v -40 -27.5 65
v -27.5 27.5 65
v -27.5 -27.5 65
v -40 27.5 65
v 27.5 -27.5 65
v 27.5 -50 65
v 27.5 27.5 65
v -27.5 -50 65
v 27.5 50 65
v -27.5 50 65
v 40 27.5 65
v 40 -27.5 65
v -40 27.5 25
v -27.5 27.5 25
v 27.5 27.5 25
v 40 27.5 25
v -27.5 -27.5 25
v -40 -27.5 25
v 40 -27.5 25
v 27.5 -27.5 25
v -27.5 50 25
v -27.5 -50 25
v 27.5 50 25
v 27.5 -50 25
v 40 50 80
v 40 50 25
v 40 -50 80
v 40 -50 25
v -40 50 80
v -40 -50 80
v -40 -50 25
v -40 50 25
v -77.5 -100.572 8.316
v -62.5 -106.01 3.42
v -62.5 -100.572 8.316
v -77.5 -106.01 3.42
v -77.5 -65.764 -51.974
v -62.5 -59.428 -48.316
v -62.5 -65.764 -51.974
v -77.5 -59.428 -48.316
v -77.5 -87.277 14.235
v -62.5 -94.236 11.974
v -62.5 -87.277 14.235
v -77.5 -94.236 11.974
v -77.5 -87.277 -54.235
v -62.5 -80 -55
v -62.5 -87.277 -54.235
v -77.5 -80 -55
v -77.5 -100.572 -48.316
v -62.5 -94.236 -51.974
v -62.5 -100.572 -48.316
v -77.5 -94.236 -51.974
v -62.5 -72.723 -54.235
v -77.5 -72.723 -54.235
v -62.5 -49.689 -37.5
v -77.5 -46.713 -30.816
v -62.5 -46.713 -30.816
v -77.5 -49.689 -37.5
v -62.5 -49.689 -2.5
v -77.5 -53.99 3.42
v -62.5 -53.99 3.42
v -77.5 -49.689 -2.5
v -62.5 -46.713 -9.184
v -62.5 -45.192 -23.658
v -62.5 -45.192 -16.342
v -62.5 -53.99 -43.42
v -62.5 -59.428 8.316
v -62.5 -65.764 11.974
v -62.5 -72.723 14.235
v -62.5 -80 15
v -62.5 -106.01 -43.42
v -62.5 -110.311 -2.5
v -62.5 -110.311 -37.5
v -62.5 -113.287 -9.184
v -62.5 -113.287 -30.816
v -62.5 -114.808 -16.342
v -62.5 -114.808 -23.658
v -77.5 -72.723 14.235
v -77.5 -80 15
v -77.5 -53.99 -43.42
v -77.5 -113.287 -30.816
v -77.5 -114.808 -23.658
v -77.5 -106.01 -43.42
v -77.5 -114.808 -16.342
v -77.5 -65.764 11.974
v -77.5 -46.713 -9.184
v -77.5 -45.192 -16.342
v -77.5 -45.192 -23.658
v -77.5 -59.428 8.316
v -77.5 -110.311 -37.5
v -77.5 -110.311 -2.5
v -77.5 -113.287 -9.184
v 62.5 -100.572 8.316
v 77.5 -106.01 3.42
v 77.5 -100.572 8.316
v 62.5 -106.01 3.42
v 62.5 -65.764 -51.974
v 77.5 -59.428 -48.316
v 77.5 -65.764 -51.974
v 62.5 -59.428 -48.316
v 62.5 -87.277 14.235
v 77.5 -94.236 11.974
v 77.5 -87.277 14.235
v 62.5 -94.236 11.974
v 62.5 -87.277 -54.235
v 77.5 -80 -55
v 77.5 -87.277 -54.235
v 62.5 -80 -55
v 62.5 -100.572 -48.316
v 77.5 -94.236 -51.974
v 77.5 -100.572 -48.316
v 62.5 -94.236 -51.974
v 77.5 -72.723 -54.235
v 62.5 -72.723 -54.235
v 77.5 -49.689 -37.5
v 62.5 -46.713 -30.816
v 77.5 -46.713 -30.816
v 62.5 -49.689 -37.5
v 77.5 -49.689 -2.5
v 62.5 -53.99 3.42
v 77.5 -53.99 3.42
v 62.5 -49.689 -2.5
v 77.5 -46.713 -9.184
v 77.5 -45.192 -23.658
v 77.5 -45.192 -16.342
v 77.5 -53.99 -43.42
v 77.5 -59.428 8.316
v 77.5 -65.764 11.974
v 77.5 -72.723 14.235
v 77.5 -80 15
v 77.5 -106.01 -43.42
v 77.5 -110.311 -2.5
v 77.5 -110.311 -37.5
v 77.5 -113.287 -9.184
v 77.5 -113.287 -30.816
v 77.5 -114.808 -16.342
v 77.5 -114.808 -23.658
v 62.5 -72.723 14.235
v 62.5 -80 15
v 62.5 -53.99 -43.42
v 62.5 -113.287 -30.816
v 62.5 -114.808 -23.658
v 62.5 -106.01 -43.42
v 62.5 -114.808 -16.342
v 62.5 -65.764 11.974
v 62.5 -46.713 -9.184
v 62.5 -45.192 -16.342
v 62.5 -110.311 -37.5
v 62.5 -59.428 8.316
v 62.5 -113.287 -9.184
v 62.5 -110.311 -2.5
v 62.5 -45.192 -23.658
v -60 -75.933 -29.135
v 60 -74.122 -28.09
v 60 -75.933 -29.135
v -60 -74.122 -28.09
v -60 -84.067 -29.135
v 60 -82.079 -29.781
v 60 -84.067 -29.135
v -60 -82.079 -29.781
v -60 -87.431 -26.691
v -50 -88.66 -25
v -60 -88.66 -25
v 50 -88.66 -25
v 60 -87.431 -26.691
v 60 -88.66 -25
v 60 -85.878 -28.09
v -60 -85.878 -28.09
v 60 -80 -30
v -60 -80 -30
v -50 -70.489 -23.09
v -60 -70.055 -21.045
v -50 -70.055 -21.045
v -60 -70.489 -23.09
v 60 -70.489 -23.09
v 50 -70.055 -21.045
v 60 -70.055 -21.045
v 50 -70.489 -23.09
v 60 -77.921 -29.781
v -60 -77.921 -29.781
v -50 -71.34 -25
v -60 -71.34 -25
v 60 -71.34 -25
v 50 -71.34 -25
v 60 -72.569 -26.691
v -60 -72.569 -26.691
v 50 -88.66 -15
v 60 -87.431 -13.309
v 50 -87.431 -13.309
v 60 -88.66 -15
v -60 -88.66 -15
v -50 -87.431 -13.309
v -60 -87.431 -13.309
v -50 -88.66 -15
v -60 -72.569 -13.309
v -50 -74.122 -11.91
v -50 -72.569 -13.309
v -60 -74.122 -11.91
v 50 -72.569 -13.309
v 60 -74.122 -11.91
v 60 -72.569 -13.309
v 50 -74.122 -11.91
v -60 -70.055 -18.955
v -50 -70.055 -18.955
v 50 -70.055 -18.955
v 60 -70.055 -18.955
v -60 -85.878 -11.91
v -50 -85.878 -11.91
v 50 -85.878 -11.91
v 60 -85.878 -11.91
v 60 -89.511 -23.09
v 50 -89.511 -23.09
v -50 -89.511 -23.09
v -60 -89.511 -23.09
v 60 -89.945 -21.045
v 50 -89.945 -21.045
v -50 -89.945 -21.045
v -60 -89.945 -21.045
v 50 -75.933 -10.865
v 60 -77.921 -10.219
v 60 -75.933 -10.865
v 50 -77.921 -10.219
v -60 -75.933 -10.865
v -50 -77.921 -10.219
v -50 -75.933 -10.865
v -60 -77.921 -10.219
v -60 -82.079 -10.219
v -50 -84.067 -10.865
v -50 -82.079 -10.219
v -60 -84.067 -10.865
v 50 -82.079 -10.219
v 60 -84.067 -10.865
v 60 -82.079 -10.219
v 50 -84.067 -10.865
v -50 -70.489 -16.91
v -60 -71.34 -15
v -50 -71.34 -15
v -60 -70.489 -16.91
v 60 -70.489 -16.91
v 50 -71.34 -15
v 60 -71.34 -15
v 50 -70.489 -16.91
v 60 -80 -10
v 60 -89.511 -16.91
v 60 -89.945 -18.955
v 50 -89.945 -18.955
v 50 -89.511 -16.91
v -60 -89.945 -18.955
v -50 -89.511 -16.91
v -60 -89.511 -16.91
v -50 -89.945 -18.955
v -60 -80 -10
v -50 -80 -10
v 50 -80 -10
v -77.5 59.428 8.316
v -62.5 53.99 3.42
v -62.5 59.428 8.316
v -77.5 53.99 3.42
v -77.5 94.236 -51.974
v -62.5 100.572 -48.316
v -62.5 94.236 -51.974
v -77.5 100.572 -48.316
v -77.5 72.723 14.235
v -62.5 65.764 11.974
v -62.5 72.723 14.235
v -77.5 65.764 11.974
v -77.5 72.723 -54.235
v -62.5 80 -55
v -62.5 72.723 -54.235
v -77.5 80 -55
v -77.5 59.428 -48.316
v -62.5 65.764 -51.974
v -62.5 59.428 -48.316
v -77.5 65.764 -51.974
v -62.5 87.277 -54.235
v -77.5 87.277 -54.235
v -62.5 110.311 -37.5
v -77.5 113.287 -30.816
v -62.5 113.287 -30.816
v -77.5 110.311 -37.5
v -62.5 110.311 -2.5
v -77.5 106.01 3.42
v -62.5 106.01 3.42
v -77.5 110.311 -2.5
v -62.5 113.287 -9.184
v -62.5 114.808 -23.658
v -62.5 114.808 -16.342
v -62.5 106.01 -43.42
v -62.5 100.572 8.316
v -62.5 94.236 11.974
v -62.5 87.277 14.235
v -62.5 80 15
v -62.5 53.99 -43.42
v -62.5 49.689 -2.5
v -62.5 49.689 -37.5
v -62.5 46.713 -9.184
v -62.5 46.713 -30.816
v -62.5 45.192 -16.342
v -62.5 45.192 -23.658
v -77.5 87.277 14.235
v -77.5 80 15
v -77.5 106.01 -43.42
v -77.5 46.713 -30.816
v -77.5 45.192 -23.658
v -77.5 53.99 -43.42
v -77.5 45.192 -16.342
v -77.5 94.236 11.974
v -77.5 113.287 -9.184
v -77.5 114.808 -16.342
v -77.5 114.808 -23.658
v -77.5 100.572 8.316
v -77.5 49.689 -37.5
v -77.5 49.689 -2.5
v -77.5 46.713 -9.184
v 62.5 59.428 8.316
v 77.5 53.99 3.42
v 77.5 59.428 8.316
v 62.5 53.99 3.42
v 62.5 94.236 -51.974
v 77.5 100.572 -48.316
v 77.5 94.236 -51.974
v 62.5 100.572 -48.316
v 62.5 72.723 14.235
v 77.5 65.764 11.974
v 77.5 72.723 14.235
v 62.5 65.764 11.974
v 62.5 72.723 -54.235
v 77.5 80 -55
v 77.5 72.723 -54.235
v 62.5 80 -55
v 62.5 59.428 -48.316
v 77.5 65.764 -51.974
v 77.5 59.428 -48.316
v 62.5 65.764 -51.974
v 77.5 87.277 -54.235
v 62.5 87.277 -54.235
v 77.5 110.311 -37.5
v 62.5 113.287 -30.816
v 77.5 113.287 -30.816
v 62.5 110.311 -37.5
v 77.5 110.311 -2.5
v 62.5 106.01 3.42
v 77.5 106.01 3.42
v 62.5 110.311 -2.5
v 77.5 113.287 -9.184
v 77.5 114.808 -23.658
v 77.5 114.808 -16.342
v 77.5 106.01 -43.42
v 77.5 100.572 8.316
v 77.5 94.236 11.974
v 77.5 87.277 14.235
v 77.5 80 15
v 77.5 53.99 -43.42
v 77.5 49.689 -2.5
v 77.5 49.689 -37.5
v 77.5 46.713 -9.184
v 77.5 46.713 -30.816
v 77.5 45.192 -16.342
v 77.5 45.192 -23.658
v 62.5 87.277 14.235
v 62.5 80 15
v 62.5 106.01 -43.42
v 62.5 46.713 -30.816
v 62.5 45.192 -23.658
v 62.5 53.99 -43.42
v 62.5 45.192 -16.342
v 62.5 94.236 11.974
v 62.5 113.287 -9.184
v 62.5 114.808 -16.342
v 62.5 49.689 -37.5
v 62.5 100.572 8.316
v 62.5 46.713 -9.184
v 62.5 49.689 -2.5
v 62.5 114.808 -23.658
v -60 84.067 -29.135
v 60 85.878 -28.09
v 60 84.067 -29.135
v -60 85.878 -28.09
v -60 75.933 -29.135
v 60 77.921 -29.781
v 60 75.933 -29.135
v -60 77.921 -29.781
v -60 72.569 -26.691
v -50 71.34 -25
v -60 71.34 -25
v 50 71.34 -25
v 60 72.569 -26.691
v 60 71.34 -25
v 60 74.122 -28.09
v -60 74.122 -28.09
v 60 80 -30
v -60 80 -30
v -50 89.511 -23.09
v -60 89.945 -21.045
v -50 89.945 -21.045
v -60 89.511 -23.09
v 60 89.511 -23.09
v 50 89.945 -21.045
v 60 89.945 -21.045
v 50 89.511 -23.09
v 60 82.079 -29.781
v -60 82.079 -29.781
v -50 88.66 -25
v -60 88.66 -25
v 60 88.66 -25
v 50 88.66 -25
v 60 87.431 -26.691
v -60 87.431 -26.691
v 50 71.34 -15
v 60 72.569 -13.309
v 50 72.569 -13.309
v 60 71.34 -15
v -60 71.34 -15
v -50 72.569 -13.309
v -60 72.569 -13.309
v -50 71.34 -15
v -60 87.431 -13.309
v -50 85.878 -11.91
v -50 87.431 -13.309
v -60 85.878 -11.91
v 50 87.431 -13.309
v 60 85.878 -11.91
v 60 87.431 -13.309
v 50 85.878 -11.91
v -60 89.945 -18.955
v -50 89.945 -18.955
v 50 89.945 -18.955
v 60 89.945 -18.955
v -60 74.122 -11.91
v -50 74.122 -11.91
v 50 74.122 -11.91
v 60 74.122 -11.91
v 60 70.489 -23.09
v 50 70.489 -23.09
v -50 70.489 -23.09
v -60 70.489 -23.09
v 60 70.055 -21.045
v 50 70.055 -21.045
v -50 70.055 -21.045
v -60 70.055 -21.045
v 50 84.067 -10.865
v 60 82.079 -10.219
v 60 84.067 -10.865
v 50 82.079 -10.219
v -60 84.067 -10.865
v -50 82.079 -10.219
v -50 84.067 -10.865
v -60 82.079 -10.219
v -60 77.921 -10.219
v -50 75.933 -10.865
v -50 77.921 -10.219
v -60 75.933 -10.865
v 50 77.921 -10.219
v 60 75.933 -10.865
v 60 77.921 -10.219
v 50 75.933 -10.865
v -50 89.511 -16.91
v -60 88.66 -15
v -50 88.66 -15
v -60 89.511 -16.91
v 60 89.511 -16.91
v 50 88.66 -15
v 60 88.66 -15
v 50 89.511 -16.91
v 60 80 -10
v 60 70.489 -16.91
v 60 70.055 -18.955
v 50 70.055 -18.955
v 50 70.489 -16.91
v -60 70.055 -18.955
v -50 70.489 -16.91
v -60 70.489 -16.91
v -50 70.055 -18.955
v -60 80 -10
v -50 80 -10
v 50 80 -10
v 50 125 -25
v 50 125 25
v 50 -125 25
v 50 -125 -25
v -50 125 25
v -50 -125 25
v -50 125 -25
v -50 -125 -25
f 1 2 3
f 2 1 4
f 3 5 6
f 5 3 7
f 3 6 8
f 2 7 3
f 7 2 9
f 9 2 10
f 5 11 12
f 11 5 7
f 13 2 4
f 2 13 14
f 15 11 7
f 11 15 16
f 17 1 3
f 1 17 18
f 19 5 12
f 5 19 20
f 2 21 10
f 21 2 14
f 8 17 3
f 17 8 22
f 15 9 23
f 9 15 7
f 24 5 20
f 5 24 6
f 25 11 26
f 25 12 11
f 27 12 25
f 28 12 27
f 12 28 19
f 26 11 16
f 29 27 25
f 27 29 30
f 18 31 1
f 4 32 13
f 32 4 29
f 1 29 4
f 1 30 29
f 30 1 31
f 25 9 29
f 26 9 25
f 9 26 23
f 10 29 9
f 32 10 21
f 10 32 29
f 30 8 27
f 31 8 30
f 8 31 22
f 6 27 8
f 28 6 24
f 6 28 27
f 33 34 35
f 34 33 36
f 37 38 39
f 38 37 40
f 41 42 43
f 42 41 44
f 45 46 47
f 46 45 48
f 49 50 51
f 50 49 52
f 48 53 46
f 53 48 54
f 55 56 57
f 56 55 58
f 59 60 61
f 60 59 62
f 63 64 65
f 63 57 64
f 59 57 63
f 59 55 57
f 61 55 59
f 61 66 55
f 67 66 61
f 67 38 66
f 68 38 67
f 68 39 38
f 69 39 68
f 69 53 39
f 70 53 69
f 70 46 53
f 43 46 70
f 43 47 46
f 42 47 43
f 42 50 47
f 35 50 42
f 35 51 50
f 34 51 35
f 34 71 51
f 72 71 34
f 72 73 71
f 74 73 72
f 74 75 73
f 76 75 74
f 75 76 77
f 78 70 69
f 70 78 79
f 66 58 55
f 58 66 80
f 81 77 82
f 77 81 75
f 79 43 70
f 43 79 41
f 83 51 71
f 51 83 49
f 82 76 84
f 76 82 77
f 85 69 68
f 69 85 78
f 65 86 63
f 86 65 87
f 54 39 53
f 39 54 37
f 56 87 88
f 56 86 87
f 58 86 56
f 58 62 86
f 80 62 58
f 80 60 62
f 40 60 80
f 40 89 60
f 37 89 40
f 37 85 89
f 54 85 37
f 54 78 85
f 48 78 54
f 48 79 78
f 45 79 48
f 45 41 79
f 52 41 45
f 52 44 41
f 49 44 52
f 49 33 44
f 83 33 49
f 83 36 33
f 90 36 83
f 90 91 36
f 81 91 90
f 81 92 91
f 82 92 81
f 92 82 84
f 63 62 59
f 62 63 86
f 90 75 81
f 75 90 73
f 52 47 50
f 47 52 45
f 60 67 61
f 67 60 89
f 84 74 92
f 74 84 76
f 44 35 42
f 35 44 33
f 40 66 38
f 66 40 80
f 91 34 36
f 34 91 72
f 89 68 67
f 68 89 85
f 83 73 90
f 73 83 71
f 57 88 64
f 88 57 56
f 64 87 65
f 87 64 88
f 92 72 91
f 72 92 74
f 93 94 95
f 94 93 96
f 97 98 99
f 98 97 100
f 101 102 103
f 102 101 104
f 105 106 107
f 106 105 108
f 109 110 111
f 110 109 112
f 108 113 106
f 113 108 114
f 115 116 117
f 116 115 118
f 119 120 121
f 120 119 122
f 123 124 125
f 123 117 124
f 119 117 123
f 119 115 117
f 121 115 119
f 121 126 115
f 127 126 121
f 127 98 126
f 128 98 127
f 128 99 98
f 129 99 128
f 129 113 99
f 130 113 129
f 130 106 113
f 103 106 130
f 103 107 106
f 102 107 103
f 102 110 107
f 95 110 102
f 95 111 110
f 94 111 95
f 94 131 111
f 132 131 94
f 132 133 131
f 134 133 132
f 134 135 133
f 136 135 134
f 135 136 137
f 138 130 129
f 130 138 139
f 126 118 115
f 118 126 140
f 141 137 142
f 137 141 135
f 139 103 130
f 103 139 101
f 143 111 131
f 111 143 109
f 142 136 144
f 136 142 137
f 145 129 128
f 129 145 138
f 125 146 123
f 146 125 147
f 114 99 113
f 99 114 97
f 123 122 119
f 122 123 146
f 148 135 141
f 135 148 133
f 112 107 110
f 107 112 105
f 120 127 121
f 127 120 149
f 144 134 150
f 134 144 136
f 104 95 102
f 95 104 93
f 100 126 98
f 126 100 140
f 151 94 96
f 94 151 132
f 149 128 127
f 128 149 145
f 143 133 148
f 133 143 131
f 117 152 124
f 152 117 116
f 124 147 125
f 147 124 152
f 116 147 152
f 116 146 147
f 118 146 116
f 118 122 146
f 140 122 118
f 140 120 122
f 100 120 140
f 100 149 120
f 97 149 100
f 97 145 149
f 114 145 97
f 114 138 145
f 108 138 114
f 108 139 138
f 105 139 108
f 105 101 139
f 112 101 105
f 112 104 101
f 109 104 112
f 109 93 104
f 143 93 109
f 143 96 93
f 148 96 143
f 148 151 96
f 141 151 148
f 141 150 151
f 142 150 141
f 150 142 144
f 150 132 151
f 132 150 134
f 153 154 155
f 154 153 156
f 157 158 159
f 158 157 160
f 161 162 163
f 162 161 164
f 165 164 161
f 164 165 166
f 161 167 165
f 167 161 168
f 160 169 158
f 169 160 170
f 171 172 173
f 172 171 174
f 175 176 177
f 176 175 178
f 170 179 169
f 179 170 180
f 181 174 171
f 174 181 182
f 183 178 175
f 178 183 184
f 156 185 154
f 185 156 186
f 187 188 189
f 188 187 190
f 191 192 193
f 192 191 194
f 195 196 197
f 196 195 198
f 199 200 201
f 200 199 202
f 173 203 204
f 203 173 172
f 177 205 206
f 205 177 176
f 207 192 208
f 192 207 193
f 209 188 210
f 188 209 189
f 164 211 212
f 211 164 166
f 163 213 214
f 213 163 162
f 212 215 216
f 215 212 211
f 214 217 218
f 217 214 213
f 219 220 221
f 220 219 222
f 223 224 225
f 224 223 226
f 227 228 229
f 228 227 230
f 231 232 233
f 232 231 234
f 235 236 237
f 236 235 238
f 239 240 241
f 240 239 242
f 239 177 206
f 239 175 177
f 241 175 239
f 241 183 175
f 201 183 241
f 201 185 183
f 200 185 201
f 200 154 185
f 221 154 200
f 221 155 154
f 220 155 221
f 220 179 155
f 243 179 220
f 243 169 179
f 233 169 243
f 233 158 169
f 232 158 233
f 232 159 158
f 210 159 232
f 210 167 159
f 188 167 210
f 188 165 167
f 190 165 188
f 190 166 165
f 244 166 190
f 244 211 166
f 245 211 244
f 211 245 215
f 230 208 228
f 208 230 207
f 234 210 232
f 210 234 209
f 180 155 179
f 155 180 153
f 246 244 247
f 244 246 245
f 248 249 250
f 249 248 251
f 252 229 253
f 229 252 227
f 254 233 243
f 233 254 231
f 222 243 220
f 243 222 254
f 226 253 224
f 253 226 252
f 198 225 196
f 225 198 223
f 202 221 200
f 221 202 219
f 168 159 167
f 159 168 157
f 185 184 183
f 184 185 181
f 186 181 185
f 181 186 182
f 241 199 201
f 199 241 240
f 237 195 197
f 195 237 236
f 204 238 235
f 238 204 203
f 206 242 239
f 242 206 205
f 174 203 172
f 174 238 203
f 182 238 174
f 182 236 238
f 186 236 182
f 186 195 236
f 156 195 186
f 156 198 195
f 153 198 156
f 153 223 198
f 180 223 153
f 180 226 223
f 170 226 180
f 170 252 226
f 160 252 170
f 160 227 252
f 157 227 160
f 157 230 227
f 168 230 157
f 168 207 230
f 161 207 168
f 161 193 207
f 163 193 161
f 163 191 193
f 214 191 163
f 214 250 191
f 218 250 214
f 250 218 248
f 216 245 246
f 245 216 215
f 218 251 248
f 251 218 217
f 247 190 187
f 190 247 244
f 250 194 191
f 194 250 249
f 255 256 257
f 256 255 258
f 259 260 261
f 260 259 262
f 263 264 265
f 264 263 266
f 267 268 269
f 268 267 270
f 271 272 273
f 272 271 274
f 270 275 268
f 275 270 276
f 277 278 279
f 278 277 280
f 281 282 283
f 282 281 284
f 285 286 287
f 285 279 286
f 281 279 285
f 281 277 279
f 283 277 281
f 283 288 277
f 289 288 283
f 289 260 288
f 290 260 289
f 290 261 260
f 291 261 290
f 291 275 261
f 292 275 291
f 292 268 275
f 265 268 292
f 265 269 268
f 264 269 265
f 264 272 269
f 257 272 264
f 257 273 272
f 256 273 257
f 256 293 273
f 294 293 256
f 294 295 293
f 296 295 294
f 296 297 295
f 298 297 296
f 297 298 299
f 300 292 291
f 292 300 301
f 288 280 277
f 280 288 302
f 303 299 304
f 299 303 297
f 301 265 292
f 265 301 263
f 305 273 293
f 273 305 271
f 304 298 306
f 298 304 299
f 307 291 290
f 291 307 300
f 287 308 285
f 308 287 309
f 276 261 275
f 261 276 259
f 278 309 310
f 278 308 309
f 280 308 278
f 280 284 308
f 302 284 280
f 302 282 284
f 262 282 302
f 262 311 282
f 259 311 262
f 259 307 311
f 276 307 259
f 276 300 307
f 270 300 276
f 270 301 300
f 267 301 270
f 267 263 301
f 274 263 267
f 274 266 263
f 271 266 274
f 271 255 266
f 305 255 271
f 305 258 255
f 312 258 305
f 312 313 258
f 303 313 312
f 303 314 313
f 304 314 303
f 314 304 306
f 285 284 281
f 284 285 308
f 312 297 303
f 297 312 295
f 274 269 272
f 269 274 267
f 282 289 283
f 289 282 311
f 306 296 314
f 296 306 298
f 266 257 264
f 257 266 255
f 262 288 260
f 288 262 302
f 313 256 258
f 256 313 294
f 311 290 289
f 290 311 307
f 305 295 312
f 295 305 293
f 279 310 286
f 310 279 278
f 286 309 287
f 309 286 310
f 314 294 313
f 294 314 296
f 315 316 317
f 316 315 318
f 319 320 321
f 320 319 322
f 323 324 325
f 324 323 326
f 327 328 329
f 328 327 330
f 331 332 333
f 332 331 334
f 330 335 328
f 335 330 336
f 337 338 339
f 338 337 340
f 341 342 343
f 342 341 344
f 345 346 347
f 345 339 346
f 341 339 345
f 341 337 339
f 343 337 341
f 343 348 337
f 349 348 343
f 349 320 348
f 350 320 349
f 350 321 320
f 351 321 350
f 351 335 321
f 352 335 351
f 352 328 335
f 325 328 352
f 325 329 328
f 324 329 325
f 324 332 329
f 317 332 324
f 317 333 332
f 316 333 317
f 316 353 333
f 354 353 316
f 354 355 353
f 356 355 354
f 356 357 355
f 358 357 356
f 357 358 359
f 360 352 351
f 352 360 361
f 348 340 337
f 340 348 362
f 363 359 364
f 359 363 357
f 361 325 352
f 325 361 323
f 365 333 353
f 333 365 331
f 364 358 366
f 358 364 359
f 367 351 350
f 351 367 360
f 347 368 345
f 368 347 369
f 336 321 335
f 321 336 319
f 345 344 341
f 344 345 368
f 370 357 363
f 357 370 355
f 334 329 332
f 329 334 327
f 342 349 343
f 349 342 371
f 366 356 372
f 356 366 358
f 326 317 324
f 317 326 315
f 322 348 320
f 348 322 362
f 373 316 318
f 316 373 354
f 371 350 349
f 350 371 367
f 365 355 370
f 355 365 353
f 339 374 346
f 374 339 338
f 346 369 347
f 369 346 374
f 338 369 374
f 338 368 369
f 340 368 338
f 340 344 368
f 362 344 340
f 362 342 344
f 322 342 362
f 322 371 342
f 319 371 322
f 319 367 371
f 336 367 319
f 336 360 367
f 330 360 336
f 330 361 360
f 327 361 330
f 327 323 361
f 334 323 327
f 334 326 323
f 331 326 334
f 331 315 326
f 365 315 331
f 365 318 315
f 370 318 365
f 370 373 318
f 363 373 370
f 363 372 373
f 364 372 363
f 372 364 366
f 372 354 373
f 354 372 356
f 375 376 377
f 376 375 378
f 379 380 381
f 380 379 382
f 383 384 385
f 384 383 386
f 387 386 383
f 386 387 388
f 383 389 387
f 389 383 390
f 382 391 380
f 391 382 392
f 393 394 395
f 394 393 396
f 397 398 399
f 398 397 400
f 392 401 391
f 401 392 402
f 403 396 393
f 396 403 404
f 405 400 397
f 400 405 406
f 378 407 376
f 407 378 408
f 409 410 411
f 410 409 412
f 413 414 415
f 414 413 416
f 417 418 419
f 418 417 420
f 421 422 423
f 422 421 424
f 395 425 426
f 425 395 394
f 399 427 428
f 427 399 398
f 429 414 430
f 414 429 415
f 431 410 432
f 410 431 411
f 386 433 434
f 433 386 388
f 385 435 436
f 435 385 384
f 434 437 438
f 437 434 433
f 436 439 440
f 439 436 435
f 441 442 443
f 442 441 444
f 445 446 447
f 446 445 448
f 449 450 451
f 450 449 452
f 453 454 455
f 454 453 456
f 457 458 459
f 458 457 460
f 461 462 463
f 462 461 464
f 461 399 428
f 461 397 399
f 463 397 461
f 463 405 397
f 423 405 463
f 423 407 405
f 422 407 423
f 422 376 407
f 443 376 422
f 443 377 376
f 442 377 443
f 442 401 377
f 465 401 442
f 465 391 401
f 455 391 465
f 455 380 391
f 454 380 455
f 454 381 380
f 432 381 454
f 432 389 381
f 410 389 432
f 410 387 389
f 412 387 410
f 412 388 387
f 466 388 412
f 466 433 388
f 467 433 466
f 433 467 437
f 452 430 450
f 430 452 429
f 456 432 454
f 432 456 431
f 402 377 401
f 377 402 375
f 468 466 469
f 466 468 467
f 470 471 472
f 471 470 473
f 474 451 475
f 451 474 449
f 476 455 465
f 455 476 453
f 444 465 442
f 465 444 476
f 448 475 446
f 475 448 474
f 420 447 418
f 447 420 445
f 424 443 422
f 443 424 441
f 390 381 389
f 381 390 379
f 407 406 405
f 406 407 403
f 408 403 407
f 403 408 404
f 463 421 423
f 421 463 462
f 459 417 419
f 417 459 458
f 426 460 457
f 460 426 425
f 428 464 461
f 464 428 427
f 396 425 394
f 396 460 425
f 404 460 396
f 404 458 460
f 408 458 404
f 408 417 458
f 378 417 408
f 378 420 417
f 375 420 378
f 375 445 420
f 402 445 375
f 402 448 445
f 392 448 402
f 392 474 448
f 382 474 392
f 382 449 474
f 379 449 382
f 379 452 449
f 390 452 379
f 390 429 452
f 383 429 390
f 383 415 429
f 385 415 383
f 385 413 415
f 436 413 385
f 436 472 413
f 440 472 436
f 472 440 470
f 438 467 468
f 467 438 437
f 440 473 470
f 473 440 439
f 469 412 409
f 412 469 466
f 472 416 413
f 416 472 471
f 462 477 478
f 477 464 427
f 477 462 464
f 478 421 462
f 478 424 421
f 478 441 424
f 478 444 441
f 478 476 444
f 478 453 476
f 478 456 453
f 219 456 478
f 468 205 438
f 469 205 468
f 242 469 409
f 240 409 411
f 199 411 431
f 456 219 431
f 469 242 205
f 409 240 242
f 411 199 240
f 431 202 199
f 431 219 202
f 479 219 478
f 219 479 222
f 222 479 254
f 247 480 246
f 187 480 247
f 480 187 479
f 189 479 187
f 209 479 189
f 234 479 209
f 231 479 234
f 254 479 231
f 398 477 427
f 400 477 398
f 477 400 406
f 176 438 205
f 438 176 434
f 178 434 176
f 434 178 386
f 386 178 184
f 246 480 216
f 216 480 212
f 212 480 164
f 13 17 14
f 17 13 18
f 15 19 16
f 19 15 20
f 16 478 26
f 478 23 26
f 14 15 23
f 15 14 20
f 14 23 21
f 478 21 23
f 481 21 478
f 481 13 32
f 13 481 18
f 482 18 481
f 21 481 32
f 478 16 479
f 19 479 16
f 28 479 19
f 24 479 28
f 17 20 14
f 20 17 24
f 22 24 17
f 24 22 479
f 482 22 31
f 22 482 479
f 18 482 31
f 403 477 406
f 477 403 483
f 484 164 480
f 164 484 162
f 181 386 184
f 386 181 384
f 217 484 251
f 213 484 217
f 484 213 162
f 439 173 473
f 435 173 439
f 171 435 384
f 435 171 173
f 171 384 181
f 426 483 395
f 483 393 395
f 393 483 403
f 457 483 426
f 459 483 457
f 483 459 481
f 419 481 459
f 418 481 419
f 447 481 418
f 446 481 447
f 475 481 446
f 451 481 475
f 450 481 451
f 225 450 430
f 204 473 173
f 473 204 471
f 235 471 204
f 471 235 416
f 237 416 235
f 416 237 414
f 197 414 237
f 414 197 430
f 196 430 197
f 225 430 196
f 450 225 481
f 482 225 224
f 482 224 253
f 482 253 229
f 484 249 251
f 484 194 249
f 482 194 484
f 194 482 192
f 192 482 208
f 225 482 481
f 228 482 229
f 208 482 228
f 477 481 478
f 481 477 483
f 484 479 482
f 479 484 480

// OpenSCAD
union() {
	cube(center = true, size = [100, 250, 50]);
	translate(v = [0, 0, 50]) {
		difference() {
			cube(center = true, size = [80, 100, 60]);
			union() {
				translate(v = [0, 0, -10]) {
					cube(center = true, size = [200, 55, 50]);
				}
				rotate(a = [0, 0, 90]) {
					translate(v = [0, 0, -10]) {
						cube(center = true, size = [200, 55, 50]);
					}
				}
			}
		}
	}
	translate(v = [0, -80, 0]) {
		translate(v = [0, 0, -20]) {
			union() {
				translate(v = [-70, 0, 0]) {
					rotate(a = [0, 90, 0]) {
						cylinder(center = true, h = 15, r = 35);
					}
				}
				translate(v = [70, 0, 0]) {
					rotate(a = [0, 90, 0]) {
						cylinder(center = true, h = 15, r = 35);
					}
				}
				rotate(a = [0, 90, 0]) {
					cylinder(center = true, h = 120, r = 10);
				}
			}
		}
	}
	translate(v = [0, 80, 0]) {
		translate(v = [0, 0, -20]) {
			union() {
				translate(v = [-70, 0, 0]) {
					rotate(a = [0, 90, 0]) {
						cylinder(center = true, h = 15, r = 35);
					}
				}
				translate(v = [70, 0, 0]) {
					rotate(a = [0, 90, 0]) {
						cylinder(center = true, h = 15, r = 35);
					}
				}
				rotate(a = [0, 90, 0]) {
					cylinder(center = true, h = 120, r = 10);
				}
			}
		}
	}
}
